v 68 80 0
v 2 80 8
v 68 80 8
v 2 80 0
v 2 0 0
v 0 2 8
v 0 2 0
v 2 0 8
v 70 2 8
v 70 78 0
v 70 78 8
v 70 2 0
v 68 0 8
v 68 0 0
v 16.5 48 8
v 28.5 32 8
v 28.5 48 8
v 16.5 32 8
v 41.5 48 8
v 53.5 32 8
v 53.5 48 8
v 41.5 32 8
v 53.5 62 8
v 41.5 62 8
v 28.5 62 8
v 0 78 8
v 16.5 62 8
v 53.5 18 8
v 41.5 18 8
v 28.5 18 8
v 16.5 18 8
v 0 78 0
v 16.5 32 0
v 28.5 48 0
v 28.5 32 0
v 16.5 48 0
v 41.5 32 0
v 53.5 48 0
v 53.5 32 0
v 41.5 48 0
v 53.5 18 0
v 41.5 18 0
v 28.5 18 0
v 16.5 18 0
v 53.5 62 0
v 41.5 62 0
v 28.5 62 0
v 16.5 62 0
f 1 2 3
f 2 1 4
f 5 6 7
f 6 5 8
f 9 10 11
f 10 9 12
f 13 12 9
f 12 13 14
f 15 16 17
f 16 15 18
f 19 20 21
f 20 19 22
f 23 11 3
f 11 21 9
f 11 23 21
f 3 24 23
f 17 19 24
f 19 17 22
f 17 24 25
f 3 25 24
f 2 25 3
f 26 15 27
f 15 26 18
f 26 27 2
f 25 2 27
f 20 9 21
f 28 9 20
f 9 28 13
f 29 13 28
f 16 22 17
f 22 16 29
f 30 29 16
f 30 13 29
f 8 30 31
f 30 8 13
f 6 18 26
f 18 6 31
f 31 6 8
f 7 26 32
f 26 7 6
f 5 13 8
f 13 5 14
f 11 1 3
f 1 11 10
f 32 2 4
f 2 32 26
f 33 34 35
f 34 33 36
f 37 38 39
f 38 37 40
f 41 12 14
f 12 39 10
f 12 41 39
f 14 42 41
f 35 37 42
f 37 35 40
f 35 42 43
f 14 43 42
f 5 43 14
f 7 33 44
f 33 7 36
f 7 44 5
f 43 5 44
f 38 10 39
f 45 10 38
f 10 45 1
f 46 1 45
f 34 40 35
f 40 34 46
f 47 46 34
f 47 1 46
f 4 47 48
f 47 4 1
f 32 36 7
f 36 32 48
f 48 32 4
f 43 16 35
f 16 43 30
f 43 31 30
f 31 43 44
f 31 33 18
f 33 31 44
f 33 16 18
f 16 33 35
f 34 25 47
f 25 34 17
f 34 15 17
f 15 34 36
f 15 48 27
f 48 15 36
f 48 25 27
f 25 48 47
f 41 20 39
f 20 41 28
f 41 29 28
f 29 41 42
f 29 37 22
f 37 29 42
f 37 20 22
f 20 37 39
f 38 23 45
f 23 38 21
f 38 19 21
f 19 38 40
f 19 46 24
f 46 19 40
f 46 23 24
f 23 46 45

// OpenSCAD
$fn = 32;

// ----------------------------------------------------------------------
// Windowed plate: 4 voids, 70 x 80 x 8 mm
// ----------------------------------------------------------------------

// --- parameters (mm) ---
plate_l = 70;             // plate length, X
plate_w = 80;             // plate width, Y
plate_t = 8;              // plate thickness, Z
edge_margin = 10;         // wall from the plate edge to any window
win_l = 12;               // pocket length
win_w = 14;               // pocket width
pitch_x = 25;             // grid pitch along X
pitch_y = 30;             // grid pitch along Y
depth_1 = 8;              // depth of void 1 (full thickness = through)
depth_2 = 8;              // depth of void 2 (full thickness = through)
depth_3 = 8;              // depth of void 3 (full thickness = through)
depth_4 = 8;              // depth of void 4 (full thickness = through)
corner_c = 2;             // corner chamfer of the plate

profile = [[2, 0], [68, 0], [70, 2], [70, 78], [68, 80], [2, 80], [0, 78], [0, 2]];  // primary outline, 8 points, counter clockwise
void_1 = [[16.5, 18], [28.5, 18], [28.5, 32], [16.5, 32]];  // pocket at grid node 0,0, 4 points
void_2 = [[16.5, 48], [28.5, 48], [28.5, 62], [16.5, 62]];  // pocket at grid node 0,1, 4 points
void_3 = [[41.5, 18], [53.5, 18], [53.5, 32], [41.5, 32]];  // pocket at grid node 1,0, 4 points
void_4 = [[41.5, 48], [53.5, 48], [53.5, 62], [41.5, 62]];  // pocket at grid node 1,1, 4 points

// --- the one profile operation ---
difference() {
  linear_extrude(height = plate_t) polygon(points = profile);
  translate([0, 0, -1])
    linear_extrude(height = plate_t + 2) polygon(points = void_1);
  translate([0, 0, -1])
    linear_extrude(height = plate_t + 2) polygon(points = void_2);
  translate([0, 0, -1])
    linear_extrude(height = plate_t + 2) polygon(points = void_3);
  translate([0, 0, -1])
    linear_extrude(height = plate_t + 2) polygon(points = void_4);
}
